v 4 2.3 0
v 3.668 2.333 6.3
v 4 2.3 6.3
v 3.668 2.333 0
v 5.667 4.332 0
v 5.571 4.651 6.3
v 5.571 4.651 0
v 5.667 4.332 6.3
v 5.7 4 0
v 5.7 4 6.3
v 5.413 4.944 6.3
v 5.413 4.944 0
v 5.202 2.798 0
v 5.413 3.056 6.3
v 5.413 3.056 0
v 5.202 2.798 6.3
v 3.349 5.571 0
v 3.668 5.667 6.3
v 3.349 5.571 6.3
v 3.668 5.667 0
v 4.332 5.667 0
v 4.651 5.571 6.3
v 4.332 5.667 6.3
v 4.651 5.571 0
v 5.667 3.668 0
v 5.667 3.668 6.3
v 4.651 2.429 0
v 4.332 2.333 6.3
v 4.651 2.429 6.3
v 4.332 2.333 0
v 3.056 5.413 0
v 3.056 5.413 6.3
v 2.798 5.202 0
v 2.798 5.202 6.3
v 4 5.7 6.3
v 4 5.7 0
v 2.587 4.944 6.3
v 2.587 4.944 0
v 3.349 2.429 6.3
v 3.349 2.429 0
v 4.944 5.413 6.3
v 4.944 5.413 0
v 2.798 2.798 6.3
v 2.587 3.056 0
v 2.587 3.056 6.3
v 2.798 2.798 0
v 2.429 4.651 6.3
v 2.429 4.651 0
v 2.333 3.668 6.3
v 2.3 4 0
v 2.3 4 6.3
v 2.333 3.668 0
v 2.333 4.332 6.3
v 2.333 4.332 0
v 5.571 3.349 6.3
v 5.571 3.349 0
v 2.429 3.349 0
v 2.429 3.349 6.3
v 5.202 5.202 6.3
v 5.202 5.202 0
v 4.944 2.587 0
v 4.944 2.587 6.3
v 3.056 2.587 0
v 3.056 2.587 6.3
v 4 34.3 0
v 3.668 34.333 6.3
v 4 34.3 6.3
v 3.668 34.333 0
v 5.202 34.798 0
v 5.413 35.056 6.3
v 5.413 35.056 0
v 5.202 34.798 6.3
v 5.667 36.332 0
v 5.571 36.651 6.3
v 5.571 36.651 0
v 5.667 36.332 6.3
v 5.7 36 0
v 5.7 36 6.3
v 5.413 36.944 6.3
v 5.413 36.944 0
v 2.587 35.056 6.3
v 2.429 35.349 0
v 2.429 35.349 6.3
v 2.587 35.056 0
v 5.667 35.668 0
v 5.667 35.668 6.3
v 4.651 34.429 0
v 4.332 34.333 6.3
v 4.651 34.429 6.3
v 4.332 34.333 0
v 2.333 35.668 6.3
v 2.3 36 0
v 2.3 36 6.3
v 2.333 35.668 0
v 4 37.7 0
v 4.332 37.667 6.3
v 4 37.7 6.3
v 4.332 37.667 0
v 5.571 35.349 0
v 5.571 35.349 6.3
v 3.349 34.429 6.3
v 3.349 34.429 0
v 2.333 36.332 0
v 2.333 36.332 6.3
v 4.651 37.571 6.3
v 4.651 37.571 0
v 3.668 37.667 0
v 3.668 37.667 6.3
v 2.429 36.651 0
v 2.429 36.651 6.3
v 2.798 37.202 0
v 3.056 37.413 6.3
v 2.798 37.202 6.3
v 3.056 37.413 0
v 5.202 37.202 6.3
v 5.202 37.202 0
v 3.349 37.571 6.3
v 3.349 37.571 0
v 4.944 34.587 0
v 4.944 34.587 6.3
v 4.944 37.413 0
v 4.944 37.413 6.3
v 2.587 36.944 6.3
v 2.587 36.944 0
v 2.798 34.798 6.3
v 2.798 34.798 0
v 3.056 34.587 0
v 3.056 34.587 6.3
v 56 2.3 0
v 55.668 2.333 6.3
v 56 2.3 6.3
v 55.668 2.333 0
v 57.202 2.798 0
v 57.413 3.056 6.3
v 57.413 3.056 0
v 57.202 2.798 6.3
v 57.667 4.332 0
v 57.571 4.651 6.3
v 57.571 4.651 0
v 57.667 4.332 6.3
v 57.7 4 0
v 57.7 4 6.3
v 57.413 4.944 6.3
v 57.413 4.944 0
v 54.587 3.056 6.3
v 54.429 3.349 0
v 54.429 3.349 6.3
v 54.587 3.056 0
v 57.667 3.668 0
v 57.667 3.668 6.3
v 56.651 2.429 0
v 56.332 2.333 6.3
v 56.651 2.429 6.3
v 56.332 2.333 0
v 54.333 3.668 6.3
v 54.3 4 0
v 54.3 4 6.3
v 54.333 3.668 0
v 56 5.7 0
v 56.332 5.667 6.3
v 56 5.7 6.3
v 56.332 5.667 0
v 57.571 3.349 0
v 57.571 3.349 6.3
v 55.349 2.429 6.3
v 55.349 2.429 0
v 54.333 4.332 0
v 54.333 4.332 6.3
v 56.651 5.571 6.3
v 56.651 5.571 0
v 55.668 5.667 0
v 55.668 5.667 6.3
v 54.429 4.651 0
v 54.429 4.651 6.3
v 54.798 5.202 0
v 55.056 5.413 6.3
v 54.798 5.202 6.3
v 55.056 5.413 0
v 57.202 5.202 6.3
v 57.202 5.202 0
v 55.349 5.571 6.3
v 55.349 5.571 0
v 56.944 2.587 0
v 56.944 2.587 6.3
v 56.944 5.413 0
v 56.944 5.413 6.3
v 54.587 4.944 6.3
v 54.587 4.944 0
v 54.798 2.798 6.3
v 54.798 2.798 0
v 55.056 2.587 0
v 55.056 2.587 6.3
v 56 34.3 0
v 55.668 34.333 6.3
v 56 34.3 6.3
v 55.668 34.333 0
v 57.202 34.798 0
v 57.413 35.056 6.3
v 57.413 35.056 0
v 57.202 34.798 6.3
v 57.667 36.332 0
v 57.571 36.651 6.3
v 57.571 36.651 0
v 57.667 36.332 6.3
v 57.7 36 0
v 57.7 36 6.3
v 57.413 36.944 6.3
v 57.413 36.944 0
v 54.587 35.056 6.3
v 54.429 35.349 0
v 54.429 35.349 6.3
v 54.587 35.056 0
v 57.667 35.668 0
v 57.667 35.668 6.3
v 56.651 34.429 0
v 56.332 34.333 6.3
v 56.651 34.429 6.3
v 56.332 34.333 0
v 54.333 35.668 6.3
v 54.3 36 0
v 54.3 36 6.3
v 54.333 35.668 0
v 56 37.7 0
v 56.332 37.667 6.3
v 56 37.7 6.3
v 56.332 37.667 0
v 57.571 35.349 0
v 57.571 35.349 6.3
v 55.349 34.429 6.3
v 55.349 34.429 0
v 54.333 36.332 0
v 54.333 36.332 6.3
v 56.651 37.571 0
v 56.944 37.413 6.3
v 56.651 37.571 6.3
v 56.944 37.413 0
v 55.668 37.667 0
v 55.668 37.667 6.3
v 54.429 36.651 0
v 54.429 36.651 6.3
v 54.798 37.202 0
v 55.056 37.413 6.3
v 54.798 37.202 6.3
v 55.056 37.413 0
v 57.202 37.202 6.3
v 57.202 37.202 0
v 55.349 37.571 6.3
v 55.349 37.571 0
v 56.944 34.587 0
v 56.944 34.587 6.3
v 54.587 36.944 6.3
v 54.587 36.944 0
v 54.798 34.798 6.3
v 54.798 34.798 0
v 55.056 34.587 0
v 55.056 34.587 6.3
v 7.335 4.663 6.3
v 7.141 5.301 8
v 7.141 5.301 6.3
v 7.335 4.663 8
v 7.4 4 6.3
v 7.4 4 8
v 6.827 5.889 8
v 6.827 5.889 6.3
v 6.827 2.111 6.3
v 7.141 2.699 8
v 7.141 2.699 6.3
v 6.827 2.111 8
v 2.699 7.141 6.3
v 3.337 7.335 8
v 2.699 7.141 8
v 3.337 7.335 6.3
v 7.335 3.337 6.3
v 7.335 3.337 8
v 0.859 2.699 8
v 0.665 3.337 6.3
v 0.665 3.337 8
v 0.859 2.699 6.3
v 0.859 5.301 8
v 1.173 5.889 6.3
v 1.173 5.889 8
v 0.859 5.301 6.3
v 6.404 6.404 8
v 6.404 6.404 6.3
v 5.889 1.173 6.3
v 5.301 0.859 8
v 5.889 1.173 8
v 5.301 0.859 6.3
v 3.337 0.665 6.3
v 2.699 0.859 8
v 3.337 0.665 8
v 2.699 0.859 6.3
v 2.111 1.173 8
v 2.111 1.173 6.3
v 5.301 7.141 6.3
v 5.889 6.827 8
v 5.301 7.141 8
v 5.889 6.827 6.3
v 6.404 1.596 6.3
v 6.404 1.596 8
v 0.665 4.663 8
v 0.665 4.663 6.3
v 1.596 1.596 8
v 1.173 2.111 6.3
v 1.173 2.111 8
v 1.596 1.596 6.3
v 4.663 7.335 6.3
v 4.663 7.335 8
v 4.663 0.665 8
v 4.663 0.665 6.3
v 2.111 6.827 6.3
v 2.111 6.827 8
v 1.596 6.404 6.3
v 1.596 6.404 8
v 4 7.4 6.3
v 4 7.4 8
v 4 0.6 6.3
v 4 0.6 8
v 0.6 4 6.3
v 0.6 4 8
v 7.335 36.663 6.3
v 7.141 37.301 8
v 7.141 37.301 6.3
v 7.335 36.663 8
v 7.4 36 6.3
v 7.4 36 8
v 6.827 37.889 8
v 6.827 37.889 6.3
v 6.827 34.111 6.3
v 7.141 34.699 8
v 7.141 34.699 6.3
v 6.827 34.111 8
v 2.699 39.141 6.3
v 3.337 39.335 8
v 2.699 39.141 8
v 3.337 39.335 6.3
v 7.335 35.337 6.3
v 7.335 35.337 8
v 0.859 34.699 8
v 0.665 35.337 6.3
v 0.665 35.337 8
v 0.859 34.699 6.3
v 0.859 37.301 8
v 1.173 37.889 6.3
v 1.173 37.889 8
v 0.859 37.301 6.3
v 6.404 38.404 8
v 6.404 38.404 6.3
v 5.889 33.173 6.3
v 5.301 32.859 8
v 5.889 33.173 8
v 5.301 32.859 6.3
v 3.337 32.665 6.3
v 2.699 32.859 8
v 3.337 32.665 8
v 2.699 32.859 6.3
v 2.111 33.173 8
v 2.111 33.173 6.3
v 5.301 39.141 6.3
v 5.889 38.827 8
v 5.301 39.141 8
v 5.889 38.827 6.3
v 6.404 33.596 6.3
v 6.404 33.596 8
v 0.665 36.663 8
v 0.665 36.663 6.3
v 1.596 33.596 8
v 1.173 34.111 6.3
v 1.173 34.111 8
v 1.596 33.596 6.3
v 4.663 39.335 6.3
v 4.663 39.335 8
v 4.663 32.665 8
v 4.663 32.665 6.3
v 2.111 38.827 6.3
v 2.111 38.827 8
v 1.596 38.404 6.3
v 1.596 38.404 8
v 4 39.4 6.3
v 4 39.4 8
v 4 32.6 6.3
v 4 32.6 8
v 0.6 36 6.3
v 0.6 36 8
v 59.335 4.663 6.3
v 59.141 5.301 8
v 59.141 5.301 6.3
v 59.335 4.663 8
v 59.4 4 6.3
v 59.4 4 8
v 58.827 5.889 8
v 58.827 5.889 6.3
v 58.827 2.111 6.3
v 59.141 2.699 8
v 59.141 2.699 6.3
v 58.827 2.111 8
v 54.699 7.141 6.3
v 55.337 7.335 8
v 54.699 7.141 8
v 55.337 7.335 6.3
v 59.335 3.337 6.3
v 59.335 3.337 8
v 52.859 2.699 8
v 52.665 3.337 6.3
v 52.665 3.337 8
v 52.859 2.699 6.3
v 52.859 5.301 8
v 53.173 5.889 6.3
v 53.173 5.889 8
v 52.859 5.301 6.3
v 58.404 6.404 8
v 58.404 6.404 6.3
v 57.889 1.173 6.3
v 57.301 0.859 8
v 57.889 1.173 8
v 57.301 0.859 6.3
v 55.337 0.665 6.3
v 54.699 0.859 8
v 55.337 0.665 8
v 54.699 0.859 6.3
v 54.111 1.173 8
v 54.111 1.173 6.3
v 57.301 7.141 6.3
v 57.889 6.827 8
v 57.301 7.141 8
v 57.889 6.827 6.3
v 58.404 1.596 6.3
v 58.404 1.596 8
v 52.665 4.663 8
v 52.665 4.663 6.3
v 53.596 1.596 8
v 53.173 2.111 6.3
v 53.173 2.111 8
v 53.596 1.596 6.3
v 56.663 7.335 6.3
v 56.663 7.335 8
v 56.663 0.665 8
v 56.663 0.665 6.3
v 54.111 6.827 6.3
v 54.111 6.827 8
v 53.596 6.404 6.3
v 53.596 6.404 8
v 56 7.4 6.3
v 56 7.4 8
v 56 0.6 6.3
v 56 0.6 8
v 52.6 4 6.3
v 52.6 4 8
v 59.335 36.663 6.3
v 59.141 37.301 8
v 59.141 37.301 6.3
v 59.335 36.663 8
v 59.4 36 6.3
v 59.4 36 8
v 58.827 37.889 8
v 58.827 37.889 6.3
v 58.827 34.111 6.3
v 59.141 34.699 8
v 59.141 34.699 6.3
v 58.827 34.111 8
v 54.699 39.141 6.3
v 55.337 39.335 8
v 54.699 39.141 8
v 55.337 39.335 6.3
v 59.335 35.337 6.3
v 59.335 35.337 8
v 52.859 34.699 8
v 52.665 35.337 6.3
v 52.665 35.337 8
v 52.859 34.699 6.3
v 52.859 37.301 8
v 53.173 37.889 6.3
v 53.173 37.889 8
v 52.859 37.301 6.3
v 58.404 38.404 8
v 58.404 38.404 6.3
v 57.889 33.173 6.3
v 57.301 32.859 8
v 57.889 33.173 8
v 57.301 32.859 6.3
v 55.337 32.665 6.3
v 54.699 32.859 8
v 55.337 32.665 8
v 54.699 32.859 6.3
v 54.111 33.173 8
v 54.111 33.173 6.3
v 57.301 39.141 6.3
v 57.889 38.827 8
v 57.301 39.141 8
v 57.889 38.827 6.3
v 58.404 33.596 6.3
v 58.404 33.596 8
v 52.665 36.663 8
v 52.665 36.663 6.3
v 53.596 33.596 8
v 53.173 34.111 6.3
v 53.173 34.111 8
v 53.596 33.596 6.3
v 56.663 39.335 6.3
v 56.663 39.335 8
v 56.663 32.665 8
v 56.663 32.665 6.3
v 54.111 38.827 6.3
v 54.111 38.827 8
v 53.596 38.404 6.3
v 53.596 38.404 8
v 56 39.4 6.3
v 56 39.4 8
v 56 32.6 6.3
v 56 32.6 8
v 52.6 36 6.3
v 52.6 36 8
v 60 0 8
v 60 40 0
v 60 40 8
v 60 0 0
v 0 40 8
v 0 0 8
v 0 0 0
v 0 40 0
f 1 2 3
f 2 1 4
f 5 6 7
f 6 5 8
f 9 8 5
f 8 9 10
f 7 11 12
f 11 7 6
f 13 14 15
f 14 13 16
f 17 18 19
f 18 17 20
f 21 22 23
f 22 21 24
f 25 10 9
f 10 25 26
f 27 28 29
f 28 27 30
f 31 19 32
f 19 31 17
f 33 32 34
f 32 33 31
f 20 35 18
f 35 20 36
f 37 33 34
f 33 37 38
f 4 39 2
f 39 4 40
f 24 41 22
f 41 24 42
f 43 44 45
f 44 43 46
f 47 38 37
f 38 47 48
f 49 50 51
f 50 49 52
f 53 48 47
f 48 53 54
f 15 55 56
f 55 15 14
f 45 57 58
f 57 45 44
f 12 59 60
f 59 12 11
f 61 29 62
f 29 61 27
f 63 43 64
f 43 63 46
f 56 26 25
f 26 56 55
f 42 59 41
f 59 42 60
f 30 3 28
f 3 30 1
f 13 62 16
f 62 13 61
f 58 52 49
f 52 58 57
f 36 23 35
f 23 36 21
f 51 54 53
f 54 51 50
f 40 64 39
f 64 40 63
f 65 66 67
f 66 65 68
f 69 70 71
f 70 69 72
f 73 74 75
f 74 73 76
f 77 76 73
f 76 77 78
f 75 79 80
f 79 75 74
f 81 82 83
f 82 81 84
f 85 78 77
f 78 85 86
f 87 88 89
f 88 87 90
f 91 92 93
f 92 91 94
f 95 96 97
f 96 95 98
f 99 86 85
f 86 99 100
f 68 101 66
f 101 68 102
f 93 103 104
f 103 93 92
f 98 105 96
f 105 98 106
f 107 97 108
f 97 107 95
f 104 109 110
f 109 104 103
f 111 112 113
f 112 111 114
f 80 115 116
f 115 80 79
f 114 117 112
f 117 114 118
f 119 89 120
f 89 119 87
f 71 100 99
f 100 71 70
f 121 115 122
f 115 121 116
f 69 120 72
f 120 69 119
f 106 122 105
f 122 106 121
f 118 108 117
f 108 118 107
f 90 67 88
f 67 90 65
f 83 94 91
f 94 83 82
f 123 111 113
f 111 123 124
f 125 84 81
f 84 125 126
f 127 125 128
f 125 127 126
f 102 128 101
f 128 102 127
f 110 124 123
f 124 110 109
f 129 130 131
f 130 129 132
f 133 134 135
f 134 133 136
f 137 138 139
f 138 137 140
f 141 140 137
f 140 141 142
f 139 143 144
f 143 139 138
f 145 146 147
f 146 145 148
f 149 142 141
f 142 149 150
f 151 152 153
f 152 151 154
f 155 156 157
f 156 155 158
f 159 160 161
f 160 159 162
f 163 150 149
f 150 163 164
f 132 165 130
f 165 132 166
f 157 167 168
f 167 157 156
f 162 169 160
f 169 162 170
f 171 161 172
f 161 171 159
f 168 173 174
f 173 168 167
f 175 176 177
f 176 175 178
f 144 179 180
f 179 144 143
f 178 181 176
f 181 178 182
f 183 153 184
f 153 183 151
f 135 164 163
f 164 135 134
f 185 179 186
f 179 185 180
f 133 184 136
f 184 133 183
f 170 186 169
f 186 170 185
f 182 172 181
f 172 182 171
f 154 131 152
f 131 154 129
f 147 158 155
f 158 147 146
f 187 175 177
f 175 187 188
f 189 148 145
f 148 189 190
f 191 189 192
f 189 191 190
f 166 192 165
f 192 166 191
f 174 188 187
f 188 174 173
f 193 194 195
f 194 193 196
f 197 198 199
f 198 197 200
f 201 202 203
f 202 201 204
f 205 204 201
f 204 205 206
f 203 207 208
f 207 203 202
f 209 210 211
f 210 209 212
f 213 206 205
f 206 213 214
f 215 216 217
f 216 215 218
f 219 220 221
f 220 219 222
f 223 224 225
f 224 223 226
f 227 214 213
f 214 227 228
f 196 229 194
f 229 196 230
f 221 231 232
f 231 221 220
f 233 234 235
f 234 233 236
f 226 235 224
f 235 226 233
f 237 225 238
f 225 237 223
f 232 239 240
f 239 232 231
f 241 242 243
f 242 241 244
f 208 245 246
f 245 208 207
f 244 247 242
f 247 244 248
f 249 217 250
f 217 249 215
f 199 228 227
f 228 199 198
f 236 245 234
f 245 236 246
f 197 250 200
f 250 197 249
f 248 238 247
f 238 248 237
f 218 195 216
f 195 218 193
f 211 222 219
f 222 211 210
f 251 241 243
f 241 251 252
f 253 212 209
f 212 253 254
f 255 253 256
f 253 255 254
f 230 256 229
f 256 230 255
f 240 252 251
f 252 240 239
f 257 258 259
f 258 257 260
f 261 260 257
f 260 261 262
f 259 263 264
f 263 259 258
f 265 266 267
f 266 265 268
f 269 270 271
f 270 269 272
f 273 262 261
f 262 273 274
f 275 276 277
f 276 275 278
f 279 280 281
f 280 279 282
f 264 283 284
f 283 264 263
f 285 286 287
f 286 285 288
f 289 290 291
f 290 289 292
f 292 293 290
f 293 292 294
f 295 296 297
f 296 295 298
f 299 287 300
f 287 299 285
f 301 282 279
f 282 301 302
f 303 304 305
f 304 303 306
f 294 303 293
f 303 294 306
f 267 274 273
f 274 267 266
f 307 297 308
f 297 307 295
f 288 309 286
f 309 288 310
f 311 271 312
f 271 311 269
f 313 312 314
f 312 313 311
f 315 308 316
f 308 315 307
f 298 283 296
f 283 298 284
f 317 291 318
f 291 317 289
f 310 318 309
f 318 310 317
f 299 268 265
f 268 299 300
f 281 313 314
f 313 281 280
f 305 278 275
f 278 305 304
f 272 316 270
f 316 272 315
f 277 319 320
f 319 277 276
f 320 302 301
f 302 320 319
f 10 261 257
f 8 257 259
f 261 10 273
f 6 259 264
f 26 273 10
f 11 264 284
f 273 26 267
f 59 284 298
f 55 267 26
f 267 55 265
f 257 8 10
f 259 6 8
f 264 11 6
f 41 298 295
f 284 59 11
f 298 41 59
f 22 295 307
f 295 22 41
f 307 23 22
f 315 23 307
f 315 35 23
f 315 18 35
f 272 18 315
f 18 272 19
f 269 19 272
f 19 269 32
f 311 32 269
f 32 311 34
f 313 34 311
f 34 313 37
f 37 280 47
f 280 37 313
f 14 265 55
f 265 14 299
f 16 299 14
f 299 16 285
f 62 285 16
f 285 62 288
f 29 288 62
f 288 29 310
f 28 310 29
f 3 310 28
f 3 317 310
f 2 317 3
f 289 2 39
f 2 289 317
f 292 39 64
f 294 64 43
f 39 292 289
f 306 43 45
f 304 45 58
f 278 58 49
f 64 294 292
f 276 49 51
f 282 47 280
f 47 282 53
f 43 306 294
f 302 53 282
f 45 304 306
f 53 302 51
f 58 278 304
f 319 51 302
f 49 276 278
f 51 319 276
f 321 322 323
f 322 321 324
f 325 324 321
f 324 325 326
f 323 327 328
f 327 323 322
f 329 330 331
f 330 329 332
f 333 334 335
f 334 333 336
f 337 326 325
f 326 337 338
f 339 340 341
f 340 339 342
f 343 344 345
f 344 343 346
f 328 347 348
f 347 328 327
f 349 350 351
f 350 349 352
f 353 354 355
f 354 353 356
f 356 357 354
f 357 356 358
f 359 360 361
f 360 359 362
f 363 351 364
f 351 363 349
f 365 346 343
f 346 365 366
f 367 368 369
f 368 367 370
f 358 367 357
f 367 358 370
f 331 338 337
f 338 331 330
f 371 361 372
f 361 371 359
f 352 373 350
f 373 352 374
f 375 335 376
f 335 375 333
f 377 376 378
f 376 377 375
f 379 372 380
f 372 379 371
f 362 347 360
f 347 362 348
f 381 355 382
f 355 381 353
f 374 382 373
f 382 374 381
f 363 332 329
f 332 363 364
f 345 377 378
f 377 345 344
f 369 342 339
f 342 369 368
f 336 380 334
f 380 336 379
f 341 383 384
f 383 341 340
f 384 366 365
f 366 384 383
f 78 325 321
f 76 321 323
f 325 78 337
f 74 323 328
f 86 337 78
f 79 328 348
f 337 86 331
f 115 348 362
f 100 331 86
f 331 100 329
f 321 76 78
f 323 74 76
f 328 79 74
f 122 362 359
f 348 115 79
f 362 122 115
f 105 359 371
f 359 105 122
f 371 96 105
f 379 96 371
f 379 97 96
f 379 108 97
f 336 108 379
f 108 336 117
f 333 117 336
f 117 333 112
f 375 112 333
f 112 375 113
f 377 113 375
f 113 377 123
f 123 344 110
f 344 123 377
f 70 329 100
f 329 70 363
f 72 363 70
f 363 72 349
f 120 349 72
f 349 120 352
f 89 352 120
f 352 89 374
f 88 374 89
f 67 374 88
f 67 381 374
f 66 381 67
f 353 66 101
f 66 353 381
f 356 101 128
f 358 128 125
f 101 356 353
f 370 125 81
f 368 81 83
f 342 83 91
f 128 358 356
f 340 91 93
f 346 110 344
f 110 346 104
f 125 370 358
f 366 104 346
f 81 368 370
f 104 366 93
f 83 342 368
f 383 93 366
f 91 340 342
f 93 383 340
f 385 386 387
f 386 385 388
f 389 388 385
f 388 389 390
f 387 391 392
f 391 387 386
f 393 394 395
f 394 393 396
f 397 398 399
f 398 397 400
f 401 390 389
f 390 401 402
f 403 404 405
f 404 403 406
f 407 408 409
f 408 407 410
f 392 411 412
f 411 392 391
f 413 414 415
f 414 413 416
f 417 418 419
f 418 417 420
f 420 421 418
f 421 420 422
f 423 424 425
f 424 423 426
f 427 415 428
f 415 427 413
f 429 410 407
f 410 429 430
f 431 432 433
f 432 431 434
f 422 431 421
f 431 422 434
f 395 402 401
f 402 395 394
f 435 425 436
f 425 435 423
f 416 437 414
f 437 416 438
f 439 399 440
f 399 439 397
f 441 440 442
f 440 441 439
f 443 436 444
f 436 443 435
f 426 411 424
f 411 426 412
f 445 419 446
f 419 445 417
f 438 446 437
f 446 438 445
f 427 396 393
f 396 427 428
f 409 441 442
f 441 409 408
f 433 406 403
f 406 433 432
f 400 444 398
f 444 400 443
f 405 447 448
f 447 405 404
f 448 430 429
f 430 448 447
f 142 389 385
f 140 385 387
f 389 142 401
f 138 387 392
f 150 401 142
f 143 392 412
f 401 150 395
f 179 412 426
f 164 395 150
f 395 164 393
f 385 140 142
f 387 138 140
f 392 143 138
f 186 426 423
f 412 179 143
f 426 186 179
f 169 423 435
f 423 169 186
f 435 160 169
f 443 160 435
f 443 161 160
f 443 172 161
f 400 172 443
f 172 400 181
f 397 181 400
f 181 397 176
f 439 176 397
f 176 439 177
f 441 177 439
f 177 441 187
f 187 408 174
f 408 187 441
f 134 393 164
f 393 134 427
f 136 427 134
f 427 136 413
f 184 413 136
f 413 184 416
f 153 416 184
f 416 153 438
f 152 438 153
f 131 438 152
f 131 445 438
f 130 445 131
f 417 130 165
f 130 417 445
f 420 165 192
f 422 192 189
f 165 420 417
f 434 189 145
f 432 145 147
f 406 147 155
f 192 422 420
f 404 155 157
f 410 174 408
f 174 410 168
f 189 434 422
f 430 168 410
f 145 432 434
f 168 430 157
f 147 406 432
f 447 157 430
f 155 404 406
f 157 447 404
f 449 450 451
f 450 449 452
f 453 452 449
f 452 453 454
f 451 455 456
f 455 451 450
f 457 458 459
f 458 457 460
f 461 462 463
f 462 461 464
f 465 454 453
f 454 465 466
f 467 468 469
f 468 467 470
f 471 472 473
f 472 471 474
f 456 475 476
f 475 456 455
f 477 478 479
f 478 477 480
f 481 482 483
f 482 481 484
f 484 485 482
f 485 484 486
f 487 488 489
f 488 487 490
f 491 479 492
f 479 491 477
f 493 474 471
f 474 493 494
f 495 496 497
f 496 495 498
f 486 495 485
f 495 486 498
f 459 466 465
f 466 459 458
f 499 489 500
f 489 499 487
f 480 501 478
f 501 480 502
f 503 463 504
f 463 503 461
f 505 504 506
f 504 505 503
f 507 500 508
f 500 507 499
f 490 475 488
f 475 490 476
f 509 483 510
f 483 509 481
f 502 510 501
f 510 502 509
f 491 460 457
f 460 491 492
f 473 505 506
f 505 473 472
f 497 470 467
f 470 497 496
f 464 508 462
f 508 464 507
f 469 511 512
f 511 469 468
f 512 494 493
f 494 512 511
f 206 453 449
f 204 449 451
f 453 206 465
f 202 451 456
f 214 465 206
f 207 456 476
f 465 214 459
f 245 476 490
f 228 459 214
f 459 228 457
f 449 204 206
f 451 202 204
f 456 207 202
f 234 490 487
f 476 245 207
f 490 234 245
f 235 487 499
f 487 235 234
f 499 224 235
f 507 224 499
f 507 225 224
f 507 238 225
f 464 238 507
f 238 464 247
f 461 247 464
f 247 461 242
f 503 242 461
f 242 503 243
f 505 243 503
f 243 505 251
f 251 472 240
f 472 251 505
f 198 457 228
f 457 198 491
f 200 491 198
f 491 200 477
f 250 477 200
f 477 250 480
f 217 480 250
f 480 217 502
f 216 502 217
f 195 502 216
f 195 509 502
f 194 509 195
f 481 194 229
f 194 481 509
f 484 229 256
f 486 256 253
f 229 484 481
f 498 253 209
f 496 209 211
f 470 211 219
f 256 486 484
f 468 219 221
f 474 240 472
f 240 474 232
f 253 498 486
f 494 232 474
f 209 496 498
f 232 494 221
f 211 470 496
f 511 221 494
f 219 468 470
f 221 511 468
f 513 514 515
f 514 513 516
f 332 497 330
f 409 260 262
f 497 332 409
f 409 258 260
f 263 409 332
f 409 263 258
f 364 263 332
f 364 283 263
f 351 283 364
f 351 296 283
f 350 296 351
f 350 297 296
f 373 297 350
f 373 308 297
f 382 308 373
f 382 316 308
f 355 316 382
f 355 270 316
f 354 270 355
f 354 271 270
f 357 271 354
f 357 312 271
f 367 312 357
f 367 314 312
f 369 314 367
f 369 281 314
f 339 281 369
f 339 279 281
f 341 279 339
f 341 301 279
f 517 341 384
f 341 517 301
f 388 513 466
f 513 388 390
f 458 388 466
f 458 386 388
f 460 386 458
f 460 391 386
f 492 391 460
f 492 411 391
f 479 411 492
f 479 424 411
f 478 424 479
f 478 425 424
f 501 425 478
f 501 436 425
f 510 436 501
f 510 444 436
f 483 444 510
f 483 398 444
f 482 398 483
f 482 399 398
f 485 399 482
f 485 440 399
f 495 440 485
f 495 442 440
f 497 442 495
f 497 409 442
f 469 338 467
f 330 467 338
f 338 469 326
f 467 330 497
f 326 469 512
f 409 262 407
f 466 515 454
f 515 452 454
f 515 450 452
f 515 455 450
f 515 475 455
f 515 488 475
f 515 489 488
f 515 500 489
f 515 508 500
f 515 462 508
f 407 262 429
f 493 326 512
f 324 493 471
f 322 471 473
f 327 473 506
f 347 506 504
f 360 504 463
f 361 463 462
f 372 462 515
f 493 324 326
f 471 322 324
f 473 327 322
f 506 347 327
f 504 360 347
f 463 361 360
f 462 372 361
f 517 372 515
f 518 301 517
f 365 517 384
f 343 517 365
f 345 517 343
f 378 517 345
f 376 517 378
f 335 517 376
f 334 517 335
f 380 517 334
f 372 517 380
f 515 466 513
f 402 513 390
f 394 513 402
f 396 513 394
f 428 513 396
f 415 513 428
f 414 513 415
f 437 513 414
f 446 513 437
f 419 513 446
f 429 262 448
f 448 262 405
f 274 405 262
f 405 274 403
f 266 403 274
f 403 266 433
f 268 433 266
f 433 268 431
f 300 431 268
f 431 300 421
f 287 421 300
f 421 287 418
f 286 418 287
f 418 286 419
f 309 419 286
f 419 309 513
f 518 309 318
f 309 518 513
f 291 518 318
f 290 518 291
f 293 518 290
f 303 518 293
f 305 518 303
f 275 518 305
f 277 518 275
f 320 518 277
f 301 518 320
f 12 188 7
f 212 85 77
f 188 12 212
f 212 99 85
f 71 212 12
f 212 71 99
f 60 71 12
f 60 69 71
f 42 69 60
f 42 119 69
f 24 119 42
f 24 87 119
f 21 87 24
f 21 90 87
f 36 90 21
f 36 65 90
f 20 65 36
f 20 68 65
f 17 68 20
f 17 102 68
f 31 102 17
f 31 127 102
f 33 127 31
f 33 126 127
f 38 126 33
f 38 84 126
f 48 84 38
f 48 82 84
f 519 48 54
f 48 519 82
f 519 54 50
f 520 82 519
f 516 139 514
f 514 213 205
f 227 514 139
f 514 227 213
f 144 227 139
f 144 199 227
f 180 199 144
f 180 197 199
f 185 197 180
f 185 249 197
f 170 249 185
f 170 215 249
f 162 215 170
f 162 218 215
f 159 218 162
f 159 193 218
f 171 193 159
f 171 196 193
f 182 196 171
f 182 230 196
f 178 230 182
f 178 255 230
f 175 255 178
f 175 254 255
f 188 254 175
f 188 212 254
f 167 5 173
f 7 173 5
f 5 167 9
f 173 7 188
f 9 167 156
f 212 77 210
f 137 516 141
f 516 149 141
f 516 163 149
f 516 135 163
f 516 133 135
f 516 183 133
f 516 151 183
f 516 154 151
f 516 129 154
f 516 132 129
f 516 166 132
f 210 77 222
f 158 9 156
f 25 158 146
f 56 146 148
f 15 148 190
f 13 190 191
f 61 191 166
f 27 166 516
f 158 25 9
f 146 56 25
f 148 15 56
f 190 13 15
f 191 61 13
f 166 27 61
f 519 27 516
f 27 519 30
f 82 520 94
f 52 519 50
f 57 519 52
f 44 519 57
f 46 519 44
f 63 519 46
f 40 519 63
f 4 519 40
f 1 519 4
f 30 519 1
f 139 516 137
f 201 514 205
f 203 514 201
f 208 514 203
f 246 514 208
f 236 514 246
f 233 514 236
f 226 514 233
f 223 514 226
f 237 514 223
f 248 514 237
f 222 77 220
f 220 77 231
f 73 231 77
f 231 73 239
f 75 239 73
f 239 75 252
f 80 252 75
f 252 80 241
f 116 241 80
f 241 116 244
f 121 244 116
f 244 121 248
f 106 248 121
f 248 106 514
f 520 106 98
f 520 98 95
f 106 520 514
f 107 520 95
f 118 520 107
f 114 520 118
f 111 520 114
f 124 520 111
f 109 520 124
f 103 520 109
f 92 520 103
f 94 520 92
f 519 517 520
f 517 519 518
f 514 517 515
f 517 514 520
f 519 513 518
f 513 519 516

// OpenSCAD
$fn = 32;

// ----------------------------------------------------------------------
// Enclosure lid: 60 x 40 x 8 mm, 4 bolt holes
// ----------------------------------------------------------------------

// --- parameters (mm) ---
length = 60;              // lid length, X
width = 40;               // lid width, Y
plate_t = 8;              // lid plate thickness
bolt_d = 3.4;             // bolt clearance
boss_lip = 4;             // bolt hole inset from the corner
sink = 1;                 // overlap of the lip and ribs into the plate
cs_d = 6.8;               // countersink diameter
cs_h = 1.7;               // countersink depth

module plate() {
  cube([length, width, plate_t]);
}

difference() {
  plate();
  /* bolt pattern matching the corner bosses */
  for (sx = [0, 1]) for (sy = [0, 1])
    translate([sx * (length - 2 * boss_lip) + boss_lip, sy * (width - 2 * boss_lip) + boss_lip, -0 - 1])
      cylinder(h = plate_t + 0 + 2, d = bolt_d);
  /* countersinks so the heads sit flush */
  for (sx = [0, 1]) for (sy = [0, 1])
    translate([sx * (length - 2 * boss_lip) + boss_lip, sy * (width - 2 * boss_lip) + boss_lip, plate_t - cs_h])
      cylinder(h = cs_h + 0.5, d = cs_d);
}
